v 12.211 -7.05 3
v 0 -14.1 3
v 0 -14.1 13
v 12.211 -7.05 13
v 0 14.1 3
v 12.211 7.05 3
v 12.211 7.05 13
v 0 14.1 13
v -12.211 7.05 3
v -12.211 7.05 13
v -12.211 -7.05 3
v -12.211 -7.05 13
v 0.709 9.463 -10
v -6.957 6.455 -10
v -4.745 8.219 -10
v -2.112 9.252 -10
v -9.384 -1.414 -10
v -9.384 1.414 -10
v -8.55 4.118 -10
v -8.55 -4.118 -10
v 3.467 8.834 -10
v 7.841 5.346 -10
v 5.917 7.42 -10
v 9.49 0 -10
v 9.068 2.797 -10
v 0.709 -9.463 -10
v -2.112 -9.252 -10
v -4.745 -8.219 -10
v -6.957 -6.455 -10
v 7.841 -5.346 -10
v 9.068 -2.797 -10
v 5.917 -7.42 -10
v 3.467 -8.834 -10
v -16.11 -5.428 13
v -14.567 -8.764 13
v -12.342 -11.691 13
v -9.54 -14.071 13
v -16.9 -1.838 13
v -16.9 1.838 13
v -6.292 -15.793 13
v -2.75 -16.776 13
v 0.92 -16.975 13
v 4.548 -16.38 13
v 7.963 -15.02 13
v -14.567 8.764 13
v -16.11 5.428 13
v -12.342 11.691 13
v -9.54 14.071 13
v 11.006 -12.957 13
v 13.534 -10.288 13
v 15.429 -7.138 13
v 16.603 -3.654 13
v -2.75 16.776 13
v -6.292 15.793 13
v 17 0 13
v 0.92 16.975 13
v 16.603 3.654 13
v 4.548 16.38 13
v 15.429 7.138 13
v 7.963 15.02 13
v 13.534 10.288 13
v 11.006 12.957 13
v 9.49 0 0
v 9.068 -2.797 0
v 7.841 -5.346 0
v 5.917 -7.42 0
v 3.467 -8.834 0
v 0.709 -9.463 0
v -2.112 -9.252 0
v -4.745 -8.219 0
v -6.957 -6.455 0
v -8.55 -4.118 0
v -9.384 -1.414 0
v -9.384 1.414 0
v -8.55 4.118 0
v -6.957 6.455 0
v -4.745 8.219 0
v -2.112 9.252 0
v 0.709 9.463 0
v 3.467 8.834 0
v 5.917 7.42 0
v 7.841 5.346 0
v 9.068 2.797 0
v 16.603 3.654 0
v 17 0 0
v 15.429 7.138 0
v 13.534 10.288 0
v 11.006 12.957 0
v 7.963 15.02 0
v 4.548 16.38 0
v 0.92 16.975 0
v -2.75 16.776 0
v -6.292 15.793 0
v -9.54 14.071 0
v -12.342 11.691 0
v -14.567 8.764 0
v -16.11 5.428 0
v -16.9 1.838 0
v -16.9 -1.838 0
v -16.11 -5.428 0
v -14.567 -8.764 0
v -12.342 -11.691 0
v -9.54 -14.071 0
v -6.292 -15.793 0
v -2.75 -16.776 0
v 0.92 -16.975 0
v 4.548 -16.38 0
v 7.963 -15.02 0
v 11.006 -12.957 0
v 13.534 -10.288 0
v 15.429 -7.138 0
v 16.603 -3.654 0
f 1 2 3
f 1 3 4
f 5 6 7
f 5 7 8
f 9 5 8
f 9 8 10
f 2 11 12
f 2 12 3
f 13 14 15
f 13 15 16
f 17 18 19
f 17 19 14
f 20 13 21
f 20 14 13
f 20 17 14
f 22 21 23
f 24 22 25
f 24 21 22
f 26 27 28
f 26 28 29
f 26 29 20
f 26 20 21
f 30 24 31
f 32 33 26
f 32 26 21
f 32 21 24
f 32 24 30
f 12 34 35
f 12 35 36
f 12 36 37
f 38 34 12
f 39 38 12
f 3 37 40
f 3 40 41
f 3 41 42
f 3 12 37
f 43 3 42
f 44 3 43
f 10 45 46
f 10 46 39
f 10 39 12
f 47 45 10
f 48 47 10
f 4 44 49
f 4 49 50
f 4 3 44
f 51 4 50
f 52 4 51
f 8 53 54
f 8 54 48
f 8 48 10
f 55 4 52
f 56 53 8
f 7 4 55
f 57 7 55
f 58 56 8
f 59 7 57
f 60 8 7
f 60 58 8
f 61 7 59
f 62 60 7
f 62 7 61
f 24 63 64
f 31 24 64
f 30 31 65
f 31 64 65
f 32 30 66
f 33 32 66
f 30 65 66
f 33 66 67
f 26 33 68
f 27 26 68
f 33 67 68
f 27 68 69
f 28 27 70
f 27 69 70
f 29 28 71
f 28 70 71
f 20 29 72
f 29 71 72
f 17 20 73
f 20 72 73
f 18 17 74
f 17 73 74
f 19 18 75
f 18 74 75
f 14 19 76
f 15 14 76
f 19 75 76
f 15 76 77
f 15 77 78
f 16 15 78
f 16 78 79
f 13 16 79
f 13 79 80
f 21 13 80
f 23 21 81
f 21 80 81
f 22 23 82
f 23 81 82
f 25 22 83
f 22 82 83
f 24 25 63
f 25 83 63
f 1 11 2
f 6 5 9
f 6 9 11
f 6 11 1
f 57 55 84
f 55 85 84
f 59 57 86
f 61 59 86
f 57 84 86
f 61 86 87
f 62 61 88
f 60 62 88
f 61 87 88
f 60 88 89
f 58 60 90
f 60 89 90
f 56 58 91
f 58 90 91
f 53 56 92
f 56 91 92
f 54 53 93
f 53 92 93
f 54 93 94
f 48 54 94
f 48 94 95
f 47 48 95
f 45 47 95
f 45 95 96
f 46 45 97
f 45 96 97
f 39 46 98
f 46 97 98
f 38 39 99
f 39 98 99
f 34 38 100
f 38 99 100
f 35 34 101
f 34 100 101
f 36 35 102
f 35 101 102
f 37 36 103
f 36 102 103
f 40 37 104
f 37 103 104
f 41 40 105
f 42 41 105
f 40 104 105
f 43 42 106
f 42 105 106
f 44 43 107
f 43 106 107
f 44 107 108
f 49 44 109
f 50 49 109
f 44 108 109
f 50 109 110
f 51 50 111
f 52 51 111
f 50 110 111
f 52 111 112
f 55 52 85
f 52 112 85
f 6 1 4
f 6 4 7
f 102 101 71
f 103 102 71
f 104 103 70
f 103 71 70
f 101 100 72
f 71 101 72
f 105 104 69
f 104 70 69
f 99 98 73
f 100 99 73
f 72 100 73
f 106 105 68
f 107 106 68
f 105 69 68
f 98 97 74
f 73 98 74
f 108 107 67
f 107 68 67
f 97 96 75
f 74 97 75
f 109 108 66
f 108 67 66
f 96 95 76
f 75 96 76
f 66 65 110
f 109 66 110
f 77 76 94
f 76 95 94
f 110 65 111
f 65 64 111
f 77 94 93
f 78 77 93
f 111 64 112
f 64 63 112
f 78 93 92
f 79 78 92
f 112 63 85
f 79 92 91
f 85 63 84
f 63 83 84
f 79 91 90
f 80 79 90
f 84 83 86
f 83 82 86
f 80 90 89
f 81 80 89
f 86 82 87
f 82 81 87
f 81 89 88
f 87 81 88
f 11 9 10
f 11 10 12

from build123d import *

# Parameters (mm, degrees)
SKETCH_R     = 17
PAD_DEPTH    = 3
SKETCH001_R  = 17
PAD001_DEPTH = 10
SKETCH002_R  = 9.49
PAD002_DEPTH = 10


with BuildPart() as part:
    # Sketch → Pad (new body)
    with BuildSketch(Plane.XY):
        Circle(SKETCH_R)
    extrude(amount=PAD_DEPTH)

    # Sketch001 (on Face3 of Pad) → Pad001 (join)
    with BuildSketch(Plane.XY.offset(3)):
        Circle(SKETCH001_R)
        Polygon((0, 14.1), (-12.210958, 7.05), (-12.210958, -7.05), (0, -14.1), (12.210958, -7.05), (12.210958, 7.05), align=None, mode=Mode.SUBTRACT)
    extrude(amount=PAD001_DEPTH)

    # Sketch002 (on Face2 of Pad001) → Pad002 (join)
    with BuildSketch(Plane(origin=(0, 0, 0), x_dir=(1, 0, 0), z_dir=(0, 0, -1))):
        Circle(SKETCH002_R)
    extrude(amount=PAD002_DEPTH)


solid = part.part
